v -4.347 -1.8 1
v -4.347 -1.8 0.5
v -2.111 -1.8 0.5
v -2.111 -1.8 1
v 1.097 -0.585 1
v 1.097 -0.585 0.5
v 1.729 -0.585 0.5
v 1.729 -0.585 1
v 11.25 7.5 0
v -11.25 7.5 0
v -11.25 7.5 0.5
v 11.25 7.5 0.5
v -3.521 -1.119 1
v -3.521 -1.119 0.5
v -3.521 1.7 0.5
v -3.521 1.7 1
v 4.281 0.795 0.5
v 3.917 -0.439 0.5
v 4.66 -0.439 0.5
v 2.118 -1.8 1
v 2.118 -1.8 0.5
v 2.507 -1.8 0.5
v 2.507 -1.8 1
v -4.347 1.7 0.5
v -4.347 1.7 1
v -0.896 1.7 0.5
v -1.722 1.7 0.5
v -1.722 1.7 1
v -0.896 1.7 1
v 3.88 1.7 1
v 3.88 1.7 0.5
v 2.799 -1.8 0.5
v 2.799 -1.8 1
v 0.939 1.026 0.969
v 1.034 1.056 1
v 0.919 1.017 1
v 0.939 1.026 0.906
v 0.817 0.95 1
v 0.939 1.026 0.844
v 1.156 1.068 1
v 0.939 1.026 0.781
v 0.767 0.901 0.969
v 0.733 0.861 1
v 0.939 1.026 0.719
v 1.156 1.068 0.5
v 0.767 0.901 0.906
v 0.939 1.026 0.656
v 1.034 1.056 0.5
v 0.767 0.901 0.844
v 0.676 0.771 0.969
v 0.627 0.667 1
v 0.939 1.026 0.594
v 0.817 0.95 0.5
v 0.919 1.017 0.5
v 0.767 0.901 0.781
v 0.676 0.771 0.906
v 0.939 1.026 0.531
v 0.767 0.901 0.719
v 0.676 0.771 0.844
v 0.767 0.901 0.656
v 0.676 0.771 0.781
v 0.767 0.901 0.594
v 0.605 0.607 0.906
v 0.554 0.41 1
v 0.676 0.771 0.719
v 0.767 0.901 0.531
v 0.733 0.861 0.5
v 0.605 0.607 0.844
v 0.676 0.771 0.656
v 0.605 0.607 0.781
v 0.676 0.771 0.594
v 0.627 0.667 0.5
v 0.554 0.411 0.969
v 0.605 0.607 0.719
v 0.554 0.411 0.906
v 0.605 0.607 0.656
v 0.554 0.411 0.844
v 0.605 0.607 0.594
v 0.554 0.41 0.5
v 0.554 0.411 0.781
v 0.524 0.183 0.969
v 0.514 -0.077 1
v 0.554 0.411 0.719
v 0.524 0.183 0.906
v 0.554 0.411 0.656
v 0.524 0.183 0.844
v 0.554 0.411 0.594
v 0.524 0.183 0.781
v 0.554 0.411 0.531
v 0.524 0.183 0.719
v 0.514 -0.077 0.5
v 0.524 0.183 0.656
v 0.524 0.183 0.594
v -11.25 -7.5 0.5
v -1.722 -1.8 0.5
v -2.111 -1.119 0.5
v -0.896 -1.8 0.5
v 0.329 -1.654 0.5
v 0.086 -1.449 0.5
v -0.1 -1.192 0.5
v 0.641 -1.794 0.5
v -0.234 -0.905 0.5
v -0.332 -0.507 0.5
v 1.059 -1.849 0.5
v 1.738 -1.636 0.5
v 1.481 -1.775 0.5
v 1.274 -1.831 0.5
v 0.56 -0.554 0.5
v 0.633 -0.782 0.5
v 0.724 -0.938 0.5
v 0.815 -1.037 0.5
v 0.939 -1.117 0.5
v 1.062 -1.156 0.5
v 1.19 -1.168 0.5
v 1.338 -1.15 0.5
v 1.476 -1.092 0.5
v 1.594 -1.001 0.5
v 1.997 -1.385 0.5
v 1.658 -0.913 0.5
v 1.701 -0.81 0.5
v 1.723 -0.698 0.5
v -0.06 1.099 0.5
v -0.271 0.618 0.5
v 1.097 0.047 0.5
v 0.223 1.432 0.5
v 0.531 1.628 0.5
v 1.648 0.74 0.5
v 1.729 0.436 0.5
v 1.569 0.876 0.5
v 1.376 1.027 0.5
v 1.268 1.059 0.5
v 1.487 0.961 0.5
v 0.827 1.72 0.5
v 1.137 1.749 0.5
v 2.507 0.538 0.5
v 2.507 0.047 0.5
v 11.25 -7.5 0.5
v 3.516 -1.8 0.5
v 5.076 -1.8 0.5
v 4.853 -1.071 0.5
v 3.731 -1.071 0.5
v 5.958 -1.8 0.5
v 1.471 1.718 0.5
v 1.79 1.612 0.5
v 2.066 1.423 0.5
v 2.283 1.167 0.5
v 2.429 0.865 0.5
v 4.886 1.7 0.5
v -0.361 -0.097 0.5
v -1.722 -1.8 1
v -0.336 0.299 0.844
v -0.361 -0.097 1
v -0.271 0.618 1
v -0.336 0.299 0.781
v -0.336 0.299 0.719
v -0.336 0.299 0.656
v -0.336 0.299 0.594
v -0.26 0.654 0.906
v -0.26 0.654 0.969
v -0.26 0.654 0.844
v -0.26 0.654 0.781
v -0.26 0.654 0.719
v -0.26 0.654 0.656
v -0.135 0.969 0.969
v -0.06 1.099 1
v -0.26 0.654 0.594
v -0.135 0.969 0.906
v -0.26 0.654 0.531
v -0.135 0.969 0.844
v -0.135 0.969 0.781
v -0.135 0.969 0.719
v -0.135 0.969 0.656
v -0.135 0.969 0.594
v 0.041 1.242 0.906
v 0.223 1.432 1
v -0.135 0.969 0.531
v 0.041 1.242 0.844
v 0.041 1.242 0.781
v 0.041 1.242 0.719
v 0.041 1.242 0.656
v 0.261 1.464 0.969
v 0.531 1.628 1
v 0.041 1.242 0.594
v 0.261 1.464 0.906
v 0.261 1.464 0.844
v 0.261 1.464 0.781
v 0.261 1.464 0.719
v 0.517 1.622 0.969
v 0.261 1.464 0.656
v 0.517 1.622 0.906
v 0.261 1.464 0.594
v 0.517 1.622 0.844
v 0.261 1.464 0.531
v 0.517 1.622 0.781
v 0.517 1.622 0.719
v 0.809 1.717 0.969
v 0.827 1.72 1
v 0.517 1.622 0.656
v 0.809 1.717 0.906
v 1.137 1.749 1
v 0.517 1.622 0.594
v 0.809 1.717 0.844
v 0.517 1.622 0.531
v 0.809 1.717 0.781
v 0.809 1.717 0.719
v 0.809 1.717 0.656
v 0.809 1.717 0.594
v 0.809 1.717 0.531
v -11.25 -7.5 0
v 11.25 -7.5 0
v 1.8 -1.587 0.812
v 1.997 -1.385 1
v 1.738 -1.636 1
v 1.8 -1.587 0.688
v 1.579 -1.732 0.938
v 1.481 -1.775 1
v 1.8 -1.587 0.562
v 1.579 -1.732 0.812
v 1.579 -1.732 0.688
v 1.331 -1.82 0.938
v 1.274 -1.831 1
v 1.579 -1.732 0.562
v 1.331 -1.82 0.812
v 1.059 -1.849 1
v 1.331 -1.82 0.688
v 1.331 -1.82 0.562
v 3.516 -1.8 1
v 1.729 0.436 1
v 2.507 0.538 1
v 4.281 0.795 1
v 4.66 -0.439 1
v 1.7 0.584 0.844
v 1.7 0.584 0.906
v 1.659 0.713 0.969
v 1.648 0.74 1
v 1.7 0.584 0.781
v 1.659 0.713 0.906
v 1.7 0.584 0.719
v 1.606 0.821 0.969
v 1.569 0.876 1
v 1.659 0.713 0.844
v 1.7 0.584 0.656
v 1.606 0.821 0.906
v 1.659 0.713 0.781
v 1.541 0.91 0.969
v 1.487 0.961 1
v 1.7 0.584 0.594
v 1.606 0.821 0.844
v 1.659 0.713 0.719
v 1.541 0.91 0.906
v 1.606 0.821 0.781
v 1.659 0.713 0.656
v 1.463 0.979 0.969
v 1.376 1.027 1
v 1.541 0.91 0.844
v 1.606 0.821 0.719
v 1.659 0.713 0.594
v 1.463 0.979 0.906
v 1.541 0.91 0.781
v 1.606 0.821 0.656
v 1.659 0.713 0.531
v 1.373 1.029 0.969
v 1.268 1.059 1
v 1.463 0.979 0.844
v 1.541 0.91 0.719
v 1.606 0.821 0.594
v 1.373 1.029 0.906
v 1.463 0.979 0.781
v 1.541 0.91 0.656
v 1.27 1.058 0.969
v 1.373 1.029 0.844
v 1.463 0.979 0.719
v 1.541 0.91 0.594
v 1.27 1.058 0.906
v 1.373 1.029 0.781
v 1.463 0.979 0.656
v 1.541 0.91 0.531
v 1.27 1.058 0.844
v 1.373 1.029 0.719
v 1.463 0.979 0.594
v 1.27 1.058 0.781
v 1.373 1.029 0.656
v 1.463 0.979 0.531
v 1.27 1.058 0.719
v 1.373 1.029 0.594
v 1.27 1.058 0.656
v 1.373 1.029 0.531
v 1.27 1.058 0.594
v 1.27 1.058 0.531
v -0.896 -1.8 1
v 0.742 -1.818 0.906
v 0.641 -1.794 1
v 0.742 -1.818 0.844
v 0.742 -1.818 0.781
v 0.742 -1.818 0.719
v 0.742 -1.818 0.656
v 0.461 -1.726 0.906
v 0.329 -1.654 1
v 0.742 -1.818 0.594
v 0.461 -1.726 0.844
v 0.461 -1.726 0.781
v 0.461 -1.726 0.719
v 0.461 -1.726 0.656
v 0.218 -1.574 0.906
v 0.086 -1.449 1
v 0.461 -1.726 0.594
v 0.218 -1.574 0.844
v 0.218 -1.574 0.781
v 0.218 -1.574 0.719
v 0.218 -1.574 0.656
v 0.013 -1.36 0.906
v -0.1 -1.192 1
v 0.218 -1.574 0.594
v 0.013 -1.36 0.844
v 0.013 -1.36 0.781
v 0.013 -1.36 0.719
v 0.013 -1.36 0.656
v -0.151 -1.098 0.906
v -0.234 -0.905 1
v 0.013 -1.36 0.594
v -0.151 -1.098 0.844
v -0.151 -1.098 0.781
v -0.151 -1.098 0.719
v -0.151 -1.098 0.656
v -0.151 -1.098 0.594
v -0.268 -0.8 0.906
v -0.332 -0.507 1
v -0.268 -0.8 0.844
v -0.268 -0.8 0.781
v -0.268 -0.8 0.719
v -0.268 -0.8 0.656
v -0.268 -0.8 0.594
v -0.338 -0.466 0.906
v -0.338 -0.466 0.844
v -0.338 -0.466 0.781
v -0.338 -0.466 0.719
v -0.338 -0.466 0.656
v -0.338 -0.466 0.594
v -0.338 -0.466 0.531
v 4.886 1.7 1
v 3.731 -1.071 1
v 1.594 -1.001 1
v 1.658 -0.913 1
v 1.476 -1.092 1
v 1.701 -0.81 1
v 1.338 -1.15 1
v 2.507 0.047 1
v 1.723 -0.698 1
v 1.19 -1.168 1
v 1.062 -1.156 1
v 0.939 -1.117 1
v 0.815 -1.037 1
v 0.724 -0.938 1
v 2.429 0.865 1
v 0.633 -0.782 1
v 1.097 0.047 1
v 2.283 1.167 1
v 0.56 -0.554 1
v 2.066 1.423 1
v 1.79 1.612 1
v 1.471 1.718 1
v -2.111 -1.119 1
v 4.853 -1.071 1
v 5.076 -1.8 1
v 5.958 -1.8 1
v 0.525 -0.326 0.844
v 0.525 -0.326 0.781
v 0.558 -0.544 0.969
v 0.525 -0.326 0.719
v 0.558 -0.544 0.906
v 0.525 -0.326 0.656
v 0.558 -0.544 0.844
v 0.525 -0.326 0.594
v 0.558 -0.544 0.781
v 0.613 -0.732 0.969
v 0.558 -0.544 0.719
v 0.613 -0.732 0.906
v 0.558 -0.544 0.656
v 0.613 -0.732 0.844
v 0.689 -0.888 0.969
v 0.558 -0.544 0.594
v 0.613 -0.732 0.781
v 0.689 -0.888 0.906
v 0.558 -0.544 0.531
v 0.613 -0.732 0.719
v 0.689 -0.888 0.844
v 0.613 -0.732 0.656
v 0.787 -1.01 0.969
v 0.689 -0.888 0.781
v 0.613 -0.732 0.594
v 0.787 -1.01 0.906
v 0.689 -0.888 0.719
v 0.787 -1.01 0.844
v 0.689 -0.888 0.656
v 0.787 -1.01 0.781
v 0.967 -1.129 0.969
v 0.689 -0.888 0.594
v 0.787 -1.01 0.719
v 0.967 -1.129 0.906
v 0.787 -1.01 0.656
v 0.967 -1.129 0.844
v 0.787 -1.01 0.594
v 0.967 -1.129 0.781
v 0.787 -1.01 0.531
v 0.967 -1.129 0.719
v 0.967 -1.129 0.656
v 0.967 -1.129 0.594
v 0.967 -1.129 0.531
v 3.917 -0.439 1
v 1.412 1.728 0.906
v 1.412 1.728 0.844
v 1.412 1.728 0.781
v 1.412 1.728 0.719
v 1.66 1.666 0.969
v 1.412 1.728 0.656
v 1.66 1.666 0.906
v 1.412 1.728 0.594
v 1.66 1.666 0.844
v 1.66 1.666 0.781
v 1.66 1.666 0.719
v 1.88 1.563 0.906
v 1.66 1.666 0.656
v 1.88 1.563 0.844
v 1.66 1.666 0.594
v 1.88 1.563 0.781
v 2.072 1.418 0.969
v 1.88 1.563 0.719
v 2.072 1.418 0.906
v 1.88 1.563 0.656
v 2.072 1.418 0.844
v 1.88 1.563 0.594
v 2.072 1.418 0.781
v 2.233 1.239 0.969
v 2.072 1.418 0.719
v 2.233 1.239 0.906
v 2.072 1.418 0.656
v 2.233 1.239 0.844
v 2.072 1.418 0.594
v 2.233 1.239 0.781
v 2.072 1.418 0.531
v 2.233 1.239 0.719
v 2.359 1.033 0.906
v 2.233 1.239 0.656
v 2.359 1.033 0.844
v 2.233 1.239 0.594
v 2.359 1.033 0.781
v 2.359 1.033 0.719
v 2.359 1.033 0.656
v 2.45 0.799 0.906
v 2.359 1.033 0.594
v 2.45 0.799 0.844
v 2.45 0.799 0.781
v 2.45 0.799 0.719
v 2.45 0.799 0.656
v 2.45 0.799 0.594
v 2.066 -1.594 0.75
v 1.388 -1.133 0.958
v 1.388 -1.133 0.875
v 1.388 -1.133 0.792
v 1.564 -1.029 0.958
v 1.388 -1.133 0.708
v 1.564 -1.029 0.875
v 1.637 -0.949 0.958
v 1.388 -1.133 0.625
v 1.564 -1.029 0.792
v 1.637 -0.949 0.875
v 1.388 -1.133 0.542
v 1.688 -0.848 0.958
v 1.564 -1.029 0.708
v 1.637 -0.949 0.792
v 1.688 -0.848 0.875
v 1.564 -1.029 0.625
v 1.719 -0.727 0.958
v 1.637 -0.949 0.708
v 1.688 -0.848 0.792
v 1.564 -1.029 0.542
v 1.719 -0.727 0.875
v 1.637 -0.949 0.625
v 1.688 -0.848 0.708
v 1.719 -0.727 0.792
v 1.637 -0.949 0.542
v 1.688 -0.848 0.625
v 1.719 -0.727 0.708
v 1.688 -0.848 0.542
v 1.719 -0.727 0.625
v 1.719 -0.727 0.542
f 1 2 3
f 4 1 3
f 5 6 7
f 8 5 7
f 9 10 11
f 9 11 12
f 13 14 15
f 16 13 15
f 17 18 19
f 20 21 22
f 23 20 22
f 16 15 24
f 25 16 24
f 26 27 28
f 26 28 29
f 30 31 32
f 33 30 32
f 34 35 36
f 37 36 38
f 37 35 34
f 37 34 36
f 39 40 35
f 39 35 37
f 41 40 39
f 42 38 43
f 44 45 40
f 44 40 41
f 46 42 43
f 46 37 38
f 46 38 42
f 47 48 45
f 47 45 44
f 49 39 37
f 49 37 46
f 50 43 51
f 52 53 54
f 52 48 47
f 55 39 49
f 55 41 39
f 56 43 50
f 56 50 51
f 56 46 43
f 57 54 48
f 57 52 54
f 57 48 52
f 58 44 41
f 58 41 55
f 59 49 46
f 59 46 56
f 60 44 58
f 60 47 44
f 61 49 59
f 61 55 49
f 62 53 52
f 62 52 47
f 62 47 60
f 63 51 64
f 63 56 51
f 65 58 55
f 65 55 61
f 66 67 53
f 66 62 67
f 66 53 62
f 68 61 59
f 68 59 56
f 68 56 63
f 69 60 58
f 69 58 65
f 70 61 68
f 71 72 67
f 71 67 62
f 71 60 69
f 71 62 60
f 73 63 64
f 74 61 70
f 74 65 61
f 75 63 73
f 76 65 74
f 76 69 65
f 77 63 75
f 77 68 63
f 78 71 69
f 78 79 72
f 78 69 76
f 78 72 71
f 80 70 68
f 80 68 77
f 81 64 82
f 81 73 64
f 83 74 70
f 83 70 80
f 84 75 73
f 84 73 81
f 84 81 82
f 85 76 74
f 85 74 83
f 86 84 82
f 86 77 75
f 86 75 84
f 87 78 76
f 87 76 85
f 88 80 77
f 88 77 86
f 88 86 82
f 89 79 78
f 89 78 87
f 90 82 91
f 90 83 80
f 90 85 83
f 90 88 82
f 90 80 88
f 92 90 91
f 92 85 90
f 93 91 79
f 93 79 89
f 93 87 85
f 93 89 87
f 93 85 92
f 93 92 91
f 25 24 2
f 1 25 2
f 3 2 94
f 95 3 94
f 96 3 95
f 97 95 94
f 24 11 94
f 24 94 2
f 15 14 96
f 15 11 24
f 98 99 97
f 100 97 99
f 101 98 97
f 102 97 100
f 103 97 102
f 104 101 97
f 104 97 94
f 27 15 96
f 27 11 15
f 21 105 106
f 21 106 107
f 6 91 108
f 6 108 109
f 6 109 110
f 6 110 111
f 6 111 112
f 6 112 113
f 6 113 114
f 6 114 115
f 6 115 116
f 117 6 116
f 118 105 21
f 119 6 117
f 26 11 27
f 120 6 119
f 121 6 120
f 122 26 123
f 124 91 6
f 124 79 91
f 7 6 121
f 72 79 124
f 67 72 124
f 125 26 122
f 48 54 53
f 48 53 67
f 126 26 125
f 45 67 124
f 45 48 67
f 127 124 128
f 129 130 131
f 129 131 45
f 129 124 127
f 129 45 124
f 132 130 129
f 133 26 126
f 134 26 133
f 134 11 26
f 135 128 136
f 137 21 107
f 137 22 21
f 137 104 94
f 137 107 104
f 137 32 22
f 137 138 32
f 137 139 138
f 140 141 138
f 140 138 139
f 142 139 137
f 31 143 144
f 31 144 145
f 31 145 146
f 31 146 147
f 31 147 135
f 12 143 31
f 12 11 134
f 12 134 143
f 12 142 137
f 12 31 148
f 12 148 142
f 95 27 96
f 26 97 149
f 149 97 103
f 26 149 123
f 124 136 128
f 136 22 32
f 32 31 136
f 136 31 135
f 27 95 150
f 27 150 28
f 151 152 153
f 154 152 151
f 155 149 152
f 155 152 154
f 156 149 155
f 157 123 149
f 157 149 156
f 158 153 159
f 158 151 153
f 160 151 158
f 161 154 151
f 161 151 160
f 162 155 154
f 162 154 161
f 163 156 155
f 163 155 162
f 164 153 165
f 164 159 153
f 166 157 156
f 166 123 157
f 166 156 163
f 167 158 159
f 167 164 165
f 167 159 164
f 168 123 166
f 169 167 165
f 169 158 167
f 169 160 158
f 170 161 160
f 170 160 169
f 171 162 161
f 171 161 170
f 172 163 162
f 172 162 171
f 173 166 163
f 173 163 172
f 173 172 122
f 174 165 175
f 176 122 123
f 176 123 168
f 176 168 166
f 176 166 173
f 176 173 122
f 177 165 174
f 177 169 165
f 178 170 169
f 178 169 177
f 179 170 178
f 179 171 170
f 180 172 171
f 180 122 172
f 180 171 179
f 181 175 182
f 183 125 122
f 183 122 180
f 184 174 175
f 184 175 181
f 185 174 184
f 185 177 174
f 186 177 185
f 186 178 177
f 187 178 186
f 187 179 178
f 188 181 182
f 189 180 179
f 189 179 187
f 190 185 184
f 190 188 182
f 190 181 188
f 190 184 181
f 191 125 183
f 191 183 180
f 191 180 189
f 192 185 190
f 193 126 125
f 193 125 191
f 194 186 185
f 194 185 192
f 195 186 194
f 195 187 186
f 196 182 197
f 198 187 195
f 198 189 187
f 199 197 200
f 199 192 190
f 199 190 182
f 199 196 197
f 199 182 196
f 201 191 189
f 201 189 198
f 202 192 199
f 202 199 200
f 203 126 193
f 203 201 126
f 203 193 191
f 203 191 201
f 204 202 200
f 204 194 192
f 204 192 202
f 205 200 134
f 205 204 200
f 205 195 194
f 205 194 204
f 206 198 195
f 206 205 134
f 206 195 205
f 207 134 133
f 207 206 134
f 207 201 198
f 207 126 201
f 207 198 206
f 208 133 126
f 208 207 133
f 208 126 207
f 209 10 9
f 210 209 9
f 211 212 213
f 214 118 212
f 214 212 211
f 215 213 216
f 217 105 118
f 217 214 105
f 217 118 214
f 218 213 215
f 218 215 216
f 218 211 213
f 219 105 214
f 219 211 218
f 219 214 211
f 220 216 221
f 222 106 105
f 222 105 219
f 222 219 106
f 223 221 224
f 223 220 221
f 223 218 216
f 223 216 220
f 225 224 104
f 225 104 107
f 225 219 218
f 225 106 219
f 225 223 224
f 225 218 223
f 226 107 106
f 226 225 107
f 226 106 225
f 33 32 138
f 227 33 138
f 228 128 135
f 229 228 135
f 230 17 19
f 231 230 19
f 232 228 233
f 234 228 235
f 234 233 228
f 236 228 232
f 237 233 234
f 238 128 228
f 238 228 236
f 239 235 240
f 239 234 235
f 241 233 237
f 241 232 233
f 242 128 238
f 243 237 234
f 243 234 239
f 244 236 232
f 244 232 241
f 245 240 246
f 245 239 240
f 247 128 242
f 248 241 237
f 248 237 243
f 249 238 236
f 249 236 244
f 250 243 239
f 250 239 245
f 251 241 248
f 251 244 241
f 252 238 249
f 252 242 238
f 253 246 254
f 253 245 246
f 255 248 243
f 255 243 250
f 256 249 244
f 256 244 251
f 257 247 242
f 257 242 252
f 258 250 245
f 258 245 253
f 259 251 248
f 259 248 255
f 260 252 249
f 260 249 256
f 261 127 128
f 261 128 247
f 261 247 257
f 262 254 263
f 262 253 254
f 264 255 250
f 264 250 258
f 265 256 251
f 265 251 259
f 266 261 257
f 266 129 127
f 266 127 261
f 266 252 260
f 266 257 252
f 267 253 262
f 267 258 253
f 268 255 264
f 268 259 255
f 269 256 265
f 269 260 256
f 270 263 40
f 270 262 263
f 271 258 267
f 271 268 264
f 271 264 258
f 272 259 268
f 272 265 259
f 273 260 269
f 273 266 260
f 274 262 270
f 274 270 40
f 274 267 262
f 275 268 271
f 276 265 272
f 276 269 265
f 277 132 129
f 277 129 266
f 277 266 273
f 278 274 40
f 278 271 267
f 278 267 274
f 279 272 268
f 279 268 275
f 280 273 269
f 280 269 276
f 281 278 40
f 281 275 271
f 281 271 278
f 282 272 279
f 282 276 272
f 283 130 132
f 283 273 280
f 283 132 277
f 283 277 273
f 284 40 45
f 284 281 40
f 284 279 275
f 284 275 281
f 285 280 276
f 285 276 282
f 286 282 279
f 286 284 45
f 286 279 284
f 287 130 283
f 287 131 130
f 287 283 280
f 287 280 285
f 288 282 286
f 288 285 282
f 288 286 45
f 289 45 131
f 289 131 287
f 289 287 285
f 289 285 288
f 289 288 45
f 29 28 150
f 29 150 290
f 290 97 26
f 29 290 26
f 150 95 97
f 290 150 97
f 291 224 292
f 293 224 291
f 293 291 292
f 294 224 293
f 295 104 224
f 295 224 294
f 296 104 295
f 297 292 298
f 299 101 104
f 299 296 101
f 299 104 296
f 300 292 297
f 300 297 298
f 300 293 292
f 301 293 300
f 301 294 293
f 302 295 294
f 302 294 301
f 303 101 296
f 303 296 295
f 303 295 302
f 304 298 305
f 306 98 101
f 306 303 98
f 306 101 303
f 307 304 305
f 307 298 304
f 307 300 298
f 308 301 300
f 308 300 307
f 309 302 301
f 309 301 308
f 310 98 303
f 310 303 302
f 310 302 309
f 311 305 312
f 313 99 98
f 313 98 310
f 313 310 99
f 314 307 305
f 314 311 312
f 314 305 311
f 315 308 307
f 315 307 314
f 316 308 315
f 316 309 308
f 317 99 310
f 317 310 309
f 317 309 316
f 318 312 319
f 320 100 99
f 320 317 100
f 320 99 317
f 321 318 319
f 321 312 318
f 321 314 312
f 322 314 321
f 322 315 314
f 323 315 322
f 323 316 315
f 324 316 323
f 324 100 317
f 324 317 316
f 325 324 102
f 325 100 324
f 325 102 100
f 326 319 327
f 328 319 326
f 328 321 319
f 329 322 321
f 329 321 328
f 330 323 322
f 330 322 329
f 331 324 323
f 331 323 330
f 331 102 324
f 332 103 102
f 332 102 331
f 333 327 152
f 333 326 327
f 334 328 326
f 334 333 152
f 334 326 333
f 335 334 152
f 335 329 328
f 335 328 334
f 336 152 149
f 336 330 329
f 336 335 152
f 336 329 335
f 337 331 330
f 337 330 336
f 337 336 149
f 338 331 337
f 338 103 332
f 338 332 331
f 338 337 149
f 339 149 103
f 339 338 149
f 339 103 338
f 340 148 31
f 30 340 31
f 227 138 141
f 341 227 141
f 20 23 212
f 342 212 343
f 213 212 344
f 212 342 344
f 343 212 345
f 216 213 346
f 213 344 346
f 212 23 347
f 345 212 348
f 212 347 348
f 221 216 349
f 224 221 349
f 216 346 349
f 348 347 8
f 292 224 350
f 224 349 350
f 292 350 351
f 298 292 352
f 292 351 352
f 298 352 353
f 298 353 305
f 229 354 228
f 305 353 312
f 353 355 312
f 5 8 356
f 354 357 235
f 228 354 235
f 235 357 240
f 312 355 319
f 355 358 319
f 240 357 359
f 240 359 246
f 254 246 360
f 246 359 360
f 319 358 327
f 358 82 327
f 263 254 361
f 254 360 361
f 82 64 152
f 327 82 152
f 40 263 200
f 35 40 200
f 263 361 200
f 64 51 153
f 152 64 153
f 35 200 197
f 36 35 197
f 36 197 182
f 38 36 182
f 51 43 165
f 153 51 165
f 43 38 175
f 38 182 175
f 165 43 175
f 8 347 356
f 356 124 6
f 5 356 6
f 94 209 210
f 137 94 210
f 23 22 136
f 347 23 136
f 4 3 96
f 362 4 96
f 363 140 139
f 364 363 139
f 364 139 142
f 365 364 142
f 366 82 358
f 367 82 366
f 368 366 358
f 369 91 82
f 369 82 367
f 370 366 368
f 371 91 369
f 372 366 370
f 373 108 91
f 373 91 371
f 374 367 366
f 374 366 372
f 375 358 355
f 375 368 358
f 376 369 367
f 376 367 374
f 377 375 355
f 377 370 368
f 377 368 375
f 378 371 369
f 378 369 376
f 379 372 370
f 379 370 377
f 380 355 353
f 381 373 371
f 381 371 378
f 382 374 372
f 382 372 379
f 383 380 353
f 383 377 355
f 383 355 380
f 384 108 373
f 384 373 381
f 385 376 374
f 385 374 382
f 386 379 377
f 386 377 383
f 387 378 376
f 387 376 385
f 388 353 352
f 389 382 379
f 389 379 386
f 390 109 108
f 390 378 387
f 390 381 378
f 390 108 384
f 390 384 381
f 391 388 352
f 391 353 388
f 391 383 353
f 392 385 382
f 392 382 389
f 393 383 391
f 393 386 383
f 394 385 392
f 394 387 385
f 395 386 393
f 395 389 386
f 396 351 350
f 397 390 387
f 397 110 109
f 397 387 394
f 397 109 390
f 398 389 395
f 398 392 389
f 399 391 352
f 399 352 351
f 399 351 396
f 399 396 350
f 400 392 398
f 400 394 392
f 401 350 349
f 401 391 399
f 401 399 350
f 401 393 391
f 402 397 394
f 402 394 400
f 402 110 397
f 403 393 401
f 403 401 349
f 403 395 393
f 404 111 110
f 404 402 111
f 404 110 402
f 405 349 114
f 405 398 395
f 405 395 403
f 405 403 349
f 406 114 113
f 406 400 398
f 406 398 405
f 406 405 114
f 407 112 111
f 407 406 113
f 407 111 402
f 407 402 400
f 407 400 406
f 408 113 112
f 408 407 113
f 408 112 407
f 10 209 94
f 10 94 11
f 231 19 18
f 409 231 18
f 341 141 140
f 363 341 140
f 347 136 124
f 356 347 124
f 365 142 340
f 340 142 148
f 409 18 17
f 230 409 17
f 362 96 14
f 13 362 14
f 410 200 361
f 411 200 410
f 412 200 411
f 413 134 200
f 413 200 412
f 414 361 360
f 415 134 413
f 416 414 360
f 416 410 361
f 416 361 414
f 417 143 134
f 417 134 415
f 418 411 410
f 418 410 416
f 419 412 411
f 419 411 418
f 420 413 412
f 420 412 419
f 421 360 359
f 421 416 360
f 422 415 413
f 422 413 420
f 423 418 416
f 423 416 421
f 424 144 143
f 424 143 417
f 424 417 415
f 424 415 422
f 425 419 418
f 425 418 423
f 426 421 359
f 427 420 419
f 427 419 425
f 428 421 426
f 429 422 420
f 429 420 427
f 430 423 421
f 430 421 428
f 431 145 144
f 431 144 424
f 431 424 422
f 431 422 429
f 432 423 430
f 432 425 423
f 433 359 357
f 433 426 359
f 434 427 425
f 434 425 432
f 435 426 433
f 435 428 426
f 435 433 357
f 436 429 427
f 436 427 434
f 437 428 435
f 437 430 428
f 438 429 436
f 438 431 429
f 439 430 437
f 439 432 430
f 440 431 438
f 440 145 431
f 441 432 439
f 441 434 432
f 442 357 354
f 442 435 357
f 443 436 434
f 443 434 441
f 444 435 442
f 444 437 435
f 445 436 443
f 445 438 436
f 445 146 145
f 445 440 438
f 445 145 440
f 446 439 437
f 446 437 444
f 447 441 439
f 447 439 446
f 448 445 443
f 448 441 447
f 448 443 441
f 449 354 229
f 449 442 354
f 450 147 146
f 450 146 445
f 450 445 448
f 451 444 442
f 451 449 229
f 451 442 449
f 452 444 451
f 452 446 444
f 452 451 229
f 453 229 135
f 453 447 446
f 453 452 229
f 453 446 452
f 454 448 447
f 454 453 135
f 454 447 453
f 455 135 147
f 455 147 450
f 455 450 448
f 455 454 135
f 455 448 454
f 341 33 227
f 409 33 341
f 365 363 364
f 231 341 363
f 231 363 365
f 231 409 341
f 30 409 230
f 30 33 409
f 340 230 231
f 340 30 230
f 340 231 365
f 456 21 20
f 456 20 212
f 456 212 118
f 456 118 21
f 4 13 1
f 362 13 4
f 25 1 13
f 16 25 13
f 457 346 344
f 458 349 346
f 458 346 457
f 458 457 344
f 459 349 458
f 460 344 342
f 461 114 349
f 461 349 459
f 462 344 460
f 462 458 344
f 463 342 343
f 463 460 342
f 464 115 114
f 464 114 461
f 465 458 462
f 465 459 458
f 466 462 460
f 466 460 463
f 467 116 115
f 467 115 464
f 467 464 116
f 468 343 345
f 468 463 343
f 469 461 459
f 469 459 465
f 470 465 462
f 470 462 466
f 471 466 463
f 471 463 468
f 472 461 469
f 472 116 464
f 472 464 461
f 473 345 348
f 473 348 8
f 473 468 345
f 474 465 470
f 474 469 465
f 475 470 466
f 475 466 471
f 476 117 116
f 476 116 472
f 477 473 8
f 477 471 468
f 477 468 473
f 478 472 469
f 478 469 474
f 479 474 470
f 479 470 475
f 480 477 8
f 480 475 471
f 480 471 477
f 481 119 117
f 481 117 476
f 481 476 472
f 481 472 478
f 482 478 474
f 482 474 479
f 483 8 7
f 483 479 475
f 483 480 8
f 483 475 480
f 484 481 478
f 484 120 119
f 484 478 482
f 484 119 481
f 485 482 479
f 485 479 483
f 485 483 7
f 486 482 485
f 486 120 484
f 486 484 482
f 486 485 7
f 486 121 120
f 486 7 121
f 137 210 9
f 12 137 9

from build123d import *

# Parameters (mm, degrees)
SKETCH1_W           = 22.5
SKETCH1_H           = 15
BOSS_EXTRUDE1_DEPTH = 0.5
WRAP1_OUTLINE_W     = 0.826388889
WRAP1_OUTLINE_H     = 3.5
WRAP1_DEPTH         = 0.5


# Read off the part's stored shape, not the designer's step: Wrap1
with BuildPart() as part:
    # Sketch1 → Boss-Extrude1 (new body)
    with BuildSketch(Plane.XY):
        Rectangle(SKETCH1_W, SKETCH1_H)
    extrude(amount=BOSS_EXTRUDE1_DEPTH)

    # Wrap1 outline → Wrap1 (add)
    # profile 1 of 4: a face of its own
    with BuildSketch(Plane.XY.offset(0.5)):
        with BuildLine():
            add(Edge.make_bspline(
                [(2.118055556, -1.8), (2.102101425, -1.731019264), (2.069534878, -1.59021157), (2.021189223, -1.454006194), (1.996527778, -1.38452691)],
                knots=[0, 0, 0, 0, 0.489893232, 1, 1, 1, 1], degree=3))
            Line((2.118055556, -1.8), (2.506944444, -1.8))
            Line((2.506944444, -1.8), (2.506944444, 0.047222222))
            Line((2.506944444, 0.047222222), (1.097222222, 0.047222222))
            Line((1.097222222, 0.047222222), (1.097222222, -0.584722222))
            Line((1.097222222, -0.584722222), (1.729166667, -0.584722222))
            add(Edge.make_bspline(
                [(1.189887153, -1.168055556), (1.224007135, -1.166641415), (1.291557812, -1.163841703), (1.389411618, -1.135479706), (1.48186011, -1.091912059), (1.552522736, -1.041311507), (1.604163451, -0.992684417), (1.637831654, -0.949615289), (1.665872255, -0.901112075), (1.689666798, -0.848077449), (1.70692943, -0.789214567), (1.719447815, -0.72564884), (1.728419327, -0.65687553), (1.728911975, -0.609311898), (1.729166667, -0.584722222)],
                knots=[0, 0, 0, 0, 0.113839351, 0.225378937, 0.337862557, 0.454399889, 0.514282548, 0.574582762, 0.636443988, 0.701264893, 0.768496234, 0.841060889, 0.917830892, 1, 1, 1, 1], degree=3))
            add(Edge.make_bspline(
                [(0.513888889, -0.076584201), (0.514572313, -0.119635576), (0.515896024, -0.203021042), (0.523217979, -0.32423507), (0.536468218, -0.437450039), (0.556814389, -0.542753882), (0.58016669, -0.640850258), (0.610908424, -0.730891969), (0.646278395, -0.813189447), (0.687302005, -0.887392166), (0.733771509, -0.953045942), (0.784892562, -1.010472833), (0.840544687, -1.059907744), (0.901681039, -1.099399842), (0.967335449, -1.130329733), (1.037327541, -1.152255059), (1.112172234, -1.165456245), (1.163501396, -1.167173038), (1.189887153, -1.168055556)],
                knots=[0, 0, 0, 0, 0.089605155, 0.173554681, 0.252640076, 0.326637626, 0.396673525, 0.462328207, 0.524393538, 0.582893738, 0.638453156, 0.691446992, 0.742603933, 0.792882167, 0.842383995, 0.893214225, 0.945106771, 1, 1, 1, 1], degree=3))
            add(Edge.make_bspline(
                [(1.155707465, 1.068055556), (1.130075838, 1.067210899), (1.079949494, 1.065559051), (1.00696703, 1.051696413), (0.938909467, 1.028085171), (0.875814409, 0.994871993), (0.817591808, 0.952846932), (0.76484425, 0.901059239), (0.716596885, 0.840386196), (0.673656251, 0.770352319), (0.635825562, 0.691866233), (0.603288773, 0.605321415), (0.575274497, 0.511186428), (0.552534046, 0.408895639), (0.535554331, 0.298727159), (0.522524141, 0.180656658), (0.514960566, 0.054664626), (0.514252816, -0.03201382), (0.513888889, -0.076584201)],
                knots=[0, 0, 0, 0, 0.052392573, 0.102461232, 0.15126336, 0.199209074, 0.247788165, 0.29759102, 0.349914456, 0.405956949, 0.465245134, 0.527852777, 0.594860669, 0.665966982, 0.741990387, 0.822734633, 0.908849485, 1, 1, 1, 1], degree=3))
            add(Edge.make_bspline(
                [(1.729166667, 0.436111111), (1.725153755, 0.461736316), (1.717367072, 0.511459652), (1.701192738, 0.583185082), (1.6824977, 0.649991098), (1.660322693, 0.711876638), (1.635538667, 0.768921126), (1.607174662, 0.820915366), (1.576291477, 0.868236988), (1.541672833, 0.910237935), (1.50458923, 0.948097333), (1.463146746, 0.97958563), (1.419810775, 1.00755935), (1.372711281, 1.02959383), (1.322861274, 1.047089034), (1.269581929, 1.059092439), (1.213672152, 1.066996713), (1.175230511, 1.067698927), (1.155707465, 1.068055556)],
                knots=[0, 0, 0, 0, 0.082191489, 0.159484973, 0.232898467, 0.301940512, 0.367695662, 0.429819924, 0.48946921, 0.54649677, 0.602106423, 0.65700512, 0.711106214, 0.765308393, 0.821396578, 0.878237506, 0.938161464, 1, 1, 1, 1], degree=3))
            Line((1.729166667, 0.436111111), (2.506944444, 0.537890625))
            add(Edge.make_bspline(
                [(1.13671875, 1.748611111), (1.183852349, 1.747570689), (1.276092384, 1.745534592), (1.411034443, 1.730174961), (1.539027431, 1.704764538), (1.659857093, 1.667729236), (1.774225525, 1.621890079), (1.880970414, 1.564492815), (1.980736808, 1.497041103), (2.072943296, 1.419502923), (2.158223008, 1.333869175), (2.234134407, 1.240180481), (2.301231448, 1.13974161), (2.361087022, 1.033221224), (2.410889646, 0.919073074), (2.452005017, 0.798088035), (2.484825247, 0.670596043), (2.499495457, 0.582581264), (2.506944444, 0.537890625)],
                knots=[0, 0, 0, 0, 0.070069074, 0.137124556, 0.201650146, 0.263813257, 0.324771258, 0.384560312, 0.443656803, 0.503520473, 0.563413726, 0.623088901, 0.682497508, 0.742828077, 0.80451978, 0.867376611, 0.932658764, 1, 1, 1, 1], degree=3))
            add(Edge.make_bspline(
                [(-0.361111111, -0.097092014), (-0.360056629, -0.029193424), (-0.357998366, 0.103338977), (-0.338716764, 0.296809121), (-0.30692414, 0.479850097), (-0.262920099, 0.652858131), (-0.207057789, 0.816068001), (-0.137589586, 0.968937488), (-0.055342885, 1.111319656), (0.038529131, 1.243069192), (0.144049567, 1.361084804), (0.258050156, 1.46596394), (0.383121972, 1.552519732), (0.516042062, 1.624841653), (0.658464001, 1.680557916), (0.809966935, 1.71955882), (0.970283346, 1.744948697), (1.080412506, 1.747372091), (1.13671875, 1.748611111)],
                knots=[0, 0, 0, 0, 0.076094269, 0.148529686, 0.217678594, 0.284172559, 0.348435986, 0.410796815, 0.472084106, 0.532492434, 0.591791888, 0.649255708, 0.705707708, 0.761835604, 0.81854385, 0.876643326, 0.936930864, 1, 1, 1, 1], degree=3))
            add(Edge.make_bspline(
                [(1.059244792, -1.848611111), (1.004723071, -1.847238309), (0.89821979, -1.844556663), (0.743173288, -1.821117291), (0.597057137, -1.783836147), (0.461013751, -1.729005295), (0.333422729, -1.660627785), (0.216232156, -1.575256979), (0.107153099, -1.476073515), (0.009896653, -1.360905337), (-0.076894112, -1.234286084), (-0.153291075, -1.098351542), (-0.218137905, -0.953529332), (-0.27026294, -0.799278052), (-0.311528227, -0.636281671), (-0.339716794, -0.464234977), (-0.35768967, -0.28356275), (-0.359953571, -0.160178706), (-0.361111111, -0.097092014)],
                knots=[0, 0, 0, 0, 0.064345405, 0.125692964, 0.184718006, 0.242009577, 0.298461161, 0.355213548, 0.412768934, 0.472141974, 0.532760404, 0.593797592, 0.656024627, 0.719840029, 0.785822383, 0.854335256, 0.925521109, 1, 1, 1, 1], degree=3))
            add(Edge.make_bspline(
                [(1.996527778, -1.38452691), (1.965683846, -1.421481302), (1.905191378, -1.493957872), (1.802494662, -1.587913316), (1.69486425, -1.668972518), (1.580037705, -1.734766305), (1.458573377, -1.785831157), (1.330913621, -1.822576666), (1.196939841, -1.844019509), (1.105653567, -1.847063556), (1.059244792, -1.848611111)],
                knots=[0, 0, 0, 0, 0.133004575, 0.260854394, 0.383963685, 0.505044677, 0.625870246, 0.747551188, 0.871658247, 1, 1, 1, 1], degree=3))
        make_face()
    # profile 2 of 4: a face of its own
    with BuildSketch(Plane.XY.offset(0.5)):
        Polygon((-2.111111111, -1.8), (-2.111111111, -1.119444444), (-3.520833333, -1.119444444), (-3.520833333, 1.7), (-4.347222222, 1.7), (-4.347222222, -1.8), align=None)
    # profile 3 of 4: a face of its own
    with BuildSketch(Plane.XY.offset(0.5)):
        with Locations((-1.309027778, -0.05)):
            Rectangle(WRAP1_OUTLINE_W, WRAP1_OUTLINE_H)
    # profile 4 of 4: a face of its own
    with BuildSketch(Plane.XY.offset(0.5)):
        Polygon((5.076497396, -1.8), (5.958333333, -1.8), (4.885850694, 1.7), (3.880208333, 1.7), (2.798611111, -1.8), (3.516384549, -1.8), (3.731336806, -1.070833333), (4.853190104, -1.070833333), align=None)
        Polygon((4.28125, 0.795377604), (4.659505208, -0.438888889), (3.917426215, -0.438888889), align=None, mode=Mode.SUBTRACT)
    extrude(amount=WRAP1_DEPTH)


solid = part.part
